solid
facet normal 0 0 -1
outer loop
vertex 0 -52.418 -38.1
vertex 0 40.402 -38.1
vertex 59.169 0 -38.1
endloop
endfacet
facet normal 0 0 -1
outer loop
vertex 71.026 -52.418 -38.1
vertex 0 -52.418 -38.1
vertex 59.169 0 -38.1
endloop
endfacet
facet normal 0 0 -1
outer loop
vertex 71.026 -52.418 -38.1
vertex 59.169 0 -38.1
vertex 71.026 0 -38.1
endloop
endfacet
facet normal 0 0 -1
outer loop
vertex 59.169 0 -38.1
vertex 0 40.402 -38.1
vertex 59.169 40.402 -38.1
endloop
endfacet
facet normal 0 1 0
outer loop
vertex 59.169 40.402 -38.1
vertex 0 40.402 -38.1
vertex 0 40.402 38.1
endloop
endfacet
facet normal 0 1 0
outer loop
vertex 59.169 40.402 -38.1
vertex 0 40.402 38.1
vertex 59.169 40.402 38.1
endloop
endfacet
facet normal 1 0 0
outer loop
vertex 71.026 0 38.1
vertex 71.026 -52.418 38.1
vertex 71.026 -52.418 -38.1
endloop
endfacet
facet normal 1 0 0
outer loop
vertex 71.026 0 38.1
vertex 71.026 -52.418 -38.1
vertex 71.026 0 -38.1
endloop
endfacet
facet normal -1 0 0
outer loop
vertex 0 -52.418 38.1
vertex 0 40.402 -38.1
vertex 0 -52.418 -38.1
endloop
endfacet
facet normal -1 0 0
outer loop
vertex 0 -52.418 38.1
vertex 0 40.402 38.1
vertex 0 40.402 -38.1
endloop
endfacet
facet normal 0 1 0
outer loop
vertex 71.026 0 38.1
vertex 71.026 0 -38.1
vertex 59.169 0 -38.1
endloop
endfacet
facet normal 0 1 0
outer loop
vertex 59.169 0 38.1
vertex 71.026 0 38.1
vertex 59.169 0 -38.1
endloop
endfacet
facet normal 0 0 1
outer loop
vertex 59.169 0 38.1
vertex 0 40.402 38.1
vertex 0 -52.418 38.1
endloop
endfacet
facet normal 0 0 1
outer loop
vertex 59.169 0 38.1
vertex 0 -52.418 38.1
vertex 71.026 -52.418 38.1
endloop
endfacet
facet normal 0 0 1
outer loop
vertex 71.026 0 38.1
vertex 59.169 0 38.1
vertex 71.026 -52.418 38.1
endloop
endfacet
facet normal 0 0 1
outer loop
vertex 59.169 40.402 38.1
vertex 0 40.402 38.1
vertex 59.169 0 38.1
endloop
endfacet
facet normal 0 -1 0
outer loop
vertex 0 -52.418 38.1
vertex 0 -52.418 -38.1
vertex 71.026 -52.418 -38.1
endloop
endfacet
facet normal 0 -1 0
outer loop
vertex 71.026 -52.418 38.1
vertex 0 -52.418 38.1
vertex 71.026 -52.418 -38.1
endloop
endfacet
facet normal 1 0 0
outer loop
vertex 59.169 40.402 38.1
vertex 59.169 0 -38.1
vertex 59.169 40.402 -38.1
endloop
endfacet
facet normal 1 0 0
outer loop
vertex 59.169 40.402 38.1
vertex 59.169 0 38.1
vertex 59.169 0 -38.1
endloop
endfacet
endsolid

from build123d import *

# Parameters (mm, degrees)
F0_W     = 59.1693818569
F0_H     = 40.4018647969
F1_DEPTH = 38.1


with BuildPart() as f1:
    # F0 (on Top) → F1 (new body, symmetric)
    with BuildSketch(Plane.XY):
        with Locations((29.5846909285, 20.2009323984)):
            Rectangle(F0_W, F0_H)
        Polygon((59.1693818569, 0), (0, 0), (0, -52.4184517562), (71.0263326764, -52.4184517562), (71.0263326764, 0), align=None)
    extrude(amount=F1_DEPTH, both=True)


solid = f1.part
